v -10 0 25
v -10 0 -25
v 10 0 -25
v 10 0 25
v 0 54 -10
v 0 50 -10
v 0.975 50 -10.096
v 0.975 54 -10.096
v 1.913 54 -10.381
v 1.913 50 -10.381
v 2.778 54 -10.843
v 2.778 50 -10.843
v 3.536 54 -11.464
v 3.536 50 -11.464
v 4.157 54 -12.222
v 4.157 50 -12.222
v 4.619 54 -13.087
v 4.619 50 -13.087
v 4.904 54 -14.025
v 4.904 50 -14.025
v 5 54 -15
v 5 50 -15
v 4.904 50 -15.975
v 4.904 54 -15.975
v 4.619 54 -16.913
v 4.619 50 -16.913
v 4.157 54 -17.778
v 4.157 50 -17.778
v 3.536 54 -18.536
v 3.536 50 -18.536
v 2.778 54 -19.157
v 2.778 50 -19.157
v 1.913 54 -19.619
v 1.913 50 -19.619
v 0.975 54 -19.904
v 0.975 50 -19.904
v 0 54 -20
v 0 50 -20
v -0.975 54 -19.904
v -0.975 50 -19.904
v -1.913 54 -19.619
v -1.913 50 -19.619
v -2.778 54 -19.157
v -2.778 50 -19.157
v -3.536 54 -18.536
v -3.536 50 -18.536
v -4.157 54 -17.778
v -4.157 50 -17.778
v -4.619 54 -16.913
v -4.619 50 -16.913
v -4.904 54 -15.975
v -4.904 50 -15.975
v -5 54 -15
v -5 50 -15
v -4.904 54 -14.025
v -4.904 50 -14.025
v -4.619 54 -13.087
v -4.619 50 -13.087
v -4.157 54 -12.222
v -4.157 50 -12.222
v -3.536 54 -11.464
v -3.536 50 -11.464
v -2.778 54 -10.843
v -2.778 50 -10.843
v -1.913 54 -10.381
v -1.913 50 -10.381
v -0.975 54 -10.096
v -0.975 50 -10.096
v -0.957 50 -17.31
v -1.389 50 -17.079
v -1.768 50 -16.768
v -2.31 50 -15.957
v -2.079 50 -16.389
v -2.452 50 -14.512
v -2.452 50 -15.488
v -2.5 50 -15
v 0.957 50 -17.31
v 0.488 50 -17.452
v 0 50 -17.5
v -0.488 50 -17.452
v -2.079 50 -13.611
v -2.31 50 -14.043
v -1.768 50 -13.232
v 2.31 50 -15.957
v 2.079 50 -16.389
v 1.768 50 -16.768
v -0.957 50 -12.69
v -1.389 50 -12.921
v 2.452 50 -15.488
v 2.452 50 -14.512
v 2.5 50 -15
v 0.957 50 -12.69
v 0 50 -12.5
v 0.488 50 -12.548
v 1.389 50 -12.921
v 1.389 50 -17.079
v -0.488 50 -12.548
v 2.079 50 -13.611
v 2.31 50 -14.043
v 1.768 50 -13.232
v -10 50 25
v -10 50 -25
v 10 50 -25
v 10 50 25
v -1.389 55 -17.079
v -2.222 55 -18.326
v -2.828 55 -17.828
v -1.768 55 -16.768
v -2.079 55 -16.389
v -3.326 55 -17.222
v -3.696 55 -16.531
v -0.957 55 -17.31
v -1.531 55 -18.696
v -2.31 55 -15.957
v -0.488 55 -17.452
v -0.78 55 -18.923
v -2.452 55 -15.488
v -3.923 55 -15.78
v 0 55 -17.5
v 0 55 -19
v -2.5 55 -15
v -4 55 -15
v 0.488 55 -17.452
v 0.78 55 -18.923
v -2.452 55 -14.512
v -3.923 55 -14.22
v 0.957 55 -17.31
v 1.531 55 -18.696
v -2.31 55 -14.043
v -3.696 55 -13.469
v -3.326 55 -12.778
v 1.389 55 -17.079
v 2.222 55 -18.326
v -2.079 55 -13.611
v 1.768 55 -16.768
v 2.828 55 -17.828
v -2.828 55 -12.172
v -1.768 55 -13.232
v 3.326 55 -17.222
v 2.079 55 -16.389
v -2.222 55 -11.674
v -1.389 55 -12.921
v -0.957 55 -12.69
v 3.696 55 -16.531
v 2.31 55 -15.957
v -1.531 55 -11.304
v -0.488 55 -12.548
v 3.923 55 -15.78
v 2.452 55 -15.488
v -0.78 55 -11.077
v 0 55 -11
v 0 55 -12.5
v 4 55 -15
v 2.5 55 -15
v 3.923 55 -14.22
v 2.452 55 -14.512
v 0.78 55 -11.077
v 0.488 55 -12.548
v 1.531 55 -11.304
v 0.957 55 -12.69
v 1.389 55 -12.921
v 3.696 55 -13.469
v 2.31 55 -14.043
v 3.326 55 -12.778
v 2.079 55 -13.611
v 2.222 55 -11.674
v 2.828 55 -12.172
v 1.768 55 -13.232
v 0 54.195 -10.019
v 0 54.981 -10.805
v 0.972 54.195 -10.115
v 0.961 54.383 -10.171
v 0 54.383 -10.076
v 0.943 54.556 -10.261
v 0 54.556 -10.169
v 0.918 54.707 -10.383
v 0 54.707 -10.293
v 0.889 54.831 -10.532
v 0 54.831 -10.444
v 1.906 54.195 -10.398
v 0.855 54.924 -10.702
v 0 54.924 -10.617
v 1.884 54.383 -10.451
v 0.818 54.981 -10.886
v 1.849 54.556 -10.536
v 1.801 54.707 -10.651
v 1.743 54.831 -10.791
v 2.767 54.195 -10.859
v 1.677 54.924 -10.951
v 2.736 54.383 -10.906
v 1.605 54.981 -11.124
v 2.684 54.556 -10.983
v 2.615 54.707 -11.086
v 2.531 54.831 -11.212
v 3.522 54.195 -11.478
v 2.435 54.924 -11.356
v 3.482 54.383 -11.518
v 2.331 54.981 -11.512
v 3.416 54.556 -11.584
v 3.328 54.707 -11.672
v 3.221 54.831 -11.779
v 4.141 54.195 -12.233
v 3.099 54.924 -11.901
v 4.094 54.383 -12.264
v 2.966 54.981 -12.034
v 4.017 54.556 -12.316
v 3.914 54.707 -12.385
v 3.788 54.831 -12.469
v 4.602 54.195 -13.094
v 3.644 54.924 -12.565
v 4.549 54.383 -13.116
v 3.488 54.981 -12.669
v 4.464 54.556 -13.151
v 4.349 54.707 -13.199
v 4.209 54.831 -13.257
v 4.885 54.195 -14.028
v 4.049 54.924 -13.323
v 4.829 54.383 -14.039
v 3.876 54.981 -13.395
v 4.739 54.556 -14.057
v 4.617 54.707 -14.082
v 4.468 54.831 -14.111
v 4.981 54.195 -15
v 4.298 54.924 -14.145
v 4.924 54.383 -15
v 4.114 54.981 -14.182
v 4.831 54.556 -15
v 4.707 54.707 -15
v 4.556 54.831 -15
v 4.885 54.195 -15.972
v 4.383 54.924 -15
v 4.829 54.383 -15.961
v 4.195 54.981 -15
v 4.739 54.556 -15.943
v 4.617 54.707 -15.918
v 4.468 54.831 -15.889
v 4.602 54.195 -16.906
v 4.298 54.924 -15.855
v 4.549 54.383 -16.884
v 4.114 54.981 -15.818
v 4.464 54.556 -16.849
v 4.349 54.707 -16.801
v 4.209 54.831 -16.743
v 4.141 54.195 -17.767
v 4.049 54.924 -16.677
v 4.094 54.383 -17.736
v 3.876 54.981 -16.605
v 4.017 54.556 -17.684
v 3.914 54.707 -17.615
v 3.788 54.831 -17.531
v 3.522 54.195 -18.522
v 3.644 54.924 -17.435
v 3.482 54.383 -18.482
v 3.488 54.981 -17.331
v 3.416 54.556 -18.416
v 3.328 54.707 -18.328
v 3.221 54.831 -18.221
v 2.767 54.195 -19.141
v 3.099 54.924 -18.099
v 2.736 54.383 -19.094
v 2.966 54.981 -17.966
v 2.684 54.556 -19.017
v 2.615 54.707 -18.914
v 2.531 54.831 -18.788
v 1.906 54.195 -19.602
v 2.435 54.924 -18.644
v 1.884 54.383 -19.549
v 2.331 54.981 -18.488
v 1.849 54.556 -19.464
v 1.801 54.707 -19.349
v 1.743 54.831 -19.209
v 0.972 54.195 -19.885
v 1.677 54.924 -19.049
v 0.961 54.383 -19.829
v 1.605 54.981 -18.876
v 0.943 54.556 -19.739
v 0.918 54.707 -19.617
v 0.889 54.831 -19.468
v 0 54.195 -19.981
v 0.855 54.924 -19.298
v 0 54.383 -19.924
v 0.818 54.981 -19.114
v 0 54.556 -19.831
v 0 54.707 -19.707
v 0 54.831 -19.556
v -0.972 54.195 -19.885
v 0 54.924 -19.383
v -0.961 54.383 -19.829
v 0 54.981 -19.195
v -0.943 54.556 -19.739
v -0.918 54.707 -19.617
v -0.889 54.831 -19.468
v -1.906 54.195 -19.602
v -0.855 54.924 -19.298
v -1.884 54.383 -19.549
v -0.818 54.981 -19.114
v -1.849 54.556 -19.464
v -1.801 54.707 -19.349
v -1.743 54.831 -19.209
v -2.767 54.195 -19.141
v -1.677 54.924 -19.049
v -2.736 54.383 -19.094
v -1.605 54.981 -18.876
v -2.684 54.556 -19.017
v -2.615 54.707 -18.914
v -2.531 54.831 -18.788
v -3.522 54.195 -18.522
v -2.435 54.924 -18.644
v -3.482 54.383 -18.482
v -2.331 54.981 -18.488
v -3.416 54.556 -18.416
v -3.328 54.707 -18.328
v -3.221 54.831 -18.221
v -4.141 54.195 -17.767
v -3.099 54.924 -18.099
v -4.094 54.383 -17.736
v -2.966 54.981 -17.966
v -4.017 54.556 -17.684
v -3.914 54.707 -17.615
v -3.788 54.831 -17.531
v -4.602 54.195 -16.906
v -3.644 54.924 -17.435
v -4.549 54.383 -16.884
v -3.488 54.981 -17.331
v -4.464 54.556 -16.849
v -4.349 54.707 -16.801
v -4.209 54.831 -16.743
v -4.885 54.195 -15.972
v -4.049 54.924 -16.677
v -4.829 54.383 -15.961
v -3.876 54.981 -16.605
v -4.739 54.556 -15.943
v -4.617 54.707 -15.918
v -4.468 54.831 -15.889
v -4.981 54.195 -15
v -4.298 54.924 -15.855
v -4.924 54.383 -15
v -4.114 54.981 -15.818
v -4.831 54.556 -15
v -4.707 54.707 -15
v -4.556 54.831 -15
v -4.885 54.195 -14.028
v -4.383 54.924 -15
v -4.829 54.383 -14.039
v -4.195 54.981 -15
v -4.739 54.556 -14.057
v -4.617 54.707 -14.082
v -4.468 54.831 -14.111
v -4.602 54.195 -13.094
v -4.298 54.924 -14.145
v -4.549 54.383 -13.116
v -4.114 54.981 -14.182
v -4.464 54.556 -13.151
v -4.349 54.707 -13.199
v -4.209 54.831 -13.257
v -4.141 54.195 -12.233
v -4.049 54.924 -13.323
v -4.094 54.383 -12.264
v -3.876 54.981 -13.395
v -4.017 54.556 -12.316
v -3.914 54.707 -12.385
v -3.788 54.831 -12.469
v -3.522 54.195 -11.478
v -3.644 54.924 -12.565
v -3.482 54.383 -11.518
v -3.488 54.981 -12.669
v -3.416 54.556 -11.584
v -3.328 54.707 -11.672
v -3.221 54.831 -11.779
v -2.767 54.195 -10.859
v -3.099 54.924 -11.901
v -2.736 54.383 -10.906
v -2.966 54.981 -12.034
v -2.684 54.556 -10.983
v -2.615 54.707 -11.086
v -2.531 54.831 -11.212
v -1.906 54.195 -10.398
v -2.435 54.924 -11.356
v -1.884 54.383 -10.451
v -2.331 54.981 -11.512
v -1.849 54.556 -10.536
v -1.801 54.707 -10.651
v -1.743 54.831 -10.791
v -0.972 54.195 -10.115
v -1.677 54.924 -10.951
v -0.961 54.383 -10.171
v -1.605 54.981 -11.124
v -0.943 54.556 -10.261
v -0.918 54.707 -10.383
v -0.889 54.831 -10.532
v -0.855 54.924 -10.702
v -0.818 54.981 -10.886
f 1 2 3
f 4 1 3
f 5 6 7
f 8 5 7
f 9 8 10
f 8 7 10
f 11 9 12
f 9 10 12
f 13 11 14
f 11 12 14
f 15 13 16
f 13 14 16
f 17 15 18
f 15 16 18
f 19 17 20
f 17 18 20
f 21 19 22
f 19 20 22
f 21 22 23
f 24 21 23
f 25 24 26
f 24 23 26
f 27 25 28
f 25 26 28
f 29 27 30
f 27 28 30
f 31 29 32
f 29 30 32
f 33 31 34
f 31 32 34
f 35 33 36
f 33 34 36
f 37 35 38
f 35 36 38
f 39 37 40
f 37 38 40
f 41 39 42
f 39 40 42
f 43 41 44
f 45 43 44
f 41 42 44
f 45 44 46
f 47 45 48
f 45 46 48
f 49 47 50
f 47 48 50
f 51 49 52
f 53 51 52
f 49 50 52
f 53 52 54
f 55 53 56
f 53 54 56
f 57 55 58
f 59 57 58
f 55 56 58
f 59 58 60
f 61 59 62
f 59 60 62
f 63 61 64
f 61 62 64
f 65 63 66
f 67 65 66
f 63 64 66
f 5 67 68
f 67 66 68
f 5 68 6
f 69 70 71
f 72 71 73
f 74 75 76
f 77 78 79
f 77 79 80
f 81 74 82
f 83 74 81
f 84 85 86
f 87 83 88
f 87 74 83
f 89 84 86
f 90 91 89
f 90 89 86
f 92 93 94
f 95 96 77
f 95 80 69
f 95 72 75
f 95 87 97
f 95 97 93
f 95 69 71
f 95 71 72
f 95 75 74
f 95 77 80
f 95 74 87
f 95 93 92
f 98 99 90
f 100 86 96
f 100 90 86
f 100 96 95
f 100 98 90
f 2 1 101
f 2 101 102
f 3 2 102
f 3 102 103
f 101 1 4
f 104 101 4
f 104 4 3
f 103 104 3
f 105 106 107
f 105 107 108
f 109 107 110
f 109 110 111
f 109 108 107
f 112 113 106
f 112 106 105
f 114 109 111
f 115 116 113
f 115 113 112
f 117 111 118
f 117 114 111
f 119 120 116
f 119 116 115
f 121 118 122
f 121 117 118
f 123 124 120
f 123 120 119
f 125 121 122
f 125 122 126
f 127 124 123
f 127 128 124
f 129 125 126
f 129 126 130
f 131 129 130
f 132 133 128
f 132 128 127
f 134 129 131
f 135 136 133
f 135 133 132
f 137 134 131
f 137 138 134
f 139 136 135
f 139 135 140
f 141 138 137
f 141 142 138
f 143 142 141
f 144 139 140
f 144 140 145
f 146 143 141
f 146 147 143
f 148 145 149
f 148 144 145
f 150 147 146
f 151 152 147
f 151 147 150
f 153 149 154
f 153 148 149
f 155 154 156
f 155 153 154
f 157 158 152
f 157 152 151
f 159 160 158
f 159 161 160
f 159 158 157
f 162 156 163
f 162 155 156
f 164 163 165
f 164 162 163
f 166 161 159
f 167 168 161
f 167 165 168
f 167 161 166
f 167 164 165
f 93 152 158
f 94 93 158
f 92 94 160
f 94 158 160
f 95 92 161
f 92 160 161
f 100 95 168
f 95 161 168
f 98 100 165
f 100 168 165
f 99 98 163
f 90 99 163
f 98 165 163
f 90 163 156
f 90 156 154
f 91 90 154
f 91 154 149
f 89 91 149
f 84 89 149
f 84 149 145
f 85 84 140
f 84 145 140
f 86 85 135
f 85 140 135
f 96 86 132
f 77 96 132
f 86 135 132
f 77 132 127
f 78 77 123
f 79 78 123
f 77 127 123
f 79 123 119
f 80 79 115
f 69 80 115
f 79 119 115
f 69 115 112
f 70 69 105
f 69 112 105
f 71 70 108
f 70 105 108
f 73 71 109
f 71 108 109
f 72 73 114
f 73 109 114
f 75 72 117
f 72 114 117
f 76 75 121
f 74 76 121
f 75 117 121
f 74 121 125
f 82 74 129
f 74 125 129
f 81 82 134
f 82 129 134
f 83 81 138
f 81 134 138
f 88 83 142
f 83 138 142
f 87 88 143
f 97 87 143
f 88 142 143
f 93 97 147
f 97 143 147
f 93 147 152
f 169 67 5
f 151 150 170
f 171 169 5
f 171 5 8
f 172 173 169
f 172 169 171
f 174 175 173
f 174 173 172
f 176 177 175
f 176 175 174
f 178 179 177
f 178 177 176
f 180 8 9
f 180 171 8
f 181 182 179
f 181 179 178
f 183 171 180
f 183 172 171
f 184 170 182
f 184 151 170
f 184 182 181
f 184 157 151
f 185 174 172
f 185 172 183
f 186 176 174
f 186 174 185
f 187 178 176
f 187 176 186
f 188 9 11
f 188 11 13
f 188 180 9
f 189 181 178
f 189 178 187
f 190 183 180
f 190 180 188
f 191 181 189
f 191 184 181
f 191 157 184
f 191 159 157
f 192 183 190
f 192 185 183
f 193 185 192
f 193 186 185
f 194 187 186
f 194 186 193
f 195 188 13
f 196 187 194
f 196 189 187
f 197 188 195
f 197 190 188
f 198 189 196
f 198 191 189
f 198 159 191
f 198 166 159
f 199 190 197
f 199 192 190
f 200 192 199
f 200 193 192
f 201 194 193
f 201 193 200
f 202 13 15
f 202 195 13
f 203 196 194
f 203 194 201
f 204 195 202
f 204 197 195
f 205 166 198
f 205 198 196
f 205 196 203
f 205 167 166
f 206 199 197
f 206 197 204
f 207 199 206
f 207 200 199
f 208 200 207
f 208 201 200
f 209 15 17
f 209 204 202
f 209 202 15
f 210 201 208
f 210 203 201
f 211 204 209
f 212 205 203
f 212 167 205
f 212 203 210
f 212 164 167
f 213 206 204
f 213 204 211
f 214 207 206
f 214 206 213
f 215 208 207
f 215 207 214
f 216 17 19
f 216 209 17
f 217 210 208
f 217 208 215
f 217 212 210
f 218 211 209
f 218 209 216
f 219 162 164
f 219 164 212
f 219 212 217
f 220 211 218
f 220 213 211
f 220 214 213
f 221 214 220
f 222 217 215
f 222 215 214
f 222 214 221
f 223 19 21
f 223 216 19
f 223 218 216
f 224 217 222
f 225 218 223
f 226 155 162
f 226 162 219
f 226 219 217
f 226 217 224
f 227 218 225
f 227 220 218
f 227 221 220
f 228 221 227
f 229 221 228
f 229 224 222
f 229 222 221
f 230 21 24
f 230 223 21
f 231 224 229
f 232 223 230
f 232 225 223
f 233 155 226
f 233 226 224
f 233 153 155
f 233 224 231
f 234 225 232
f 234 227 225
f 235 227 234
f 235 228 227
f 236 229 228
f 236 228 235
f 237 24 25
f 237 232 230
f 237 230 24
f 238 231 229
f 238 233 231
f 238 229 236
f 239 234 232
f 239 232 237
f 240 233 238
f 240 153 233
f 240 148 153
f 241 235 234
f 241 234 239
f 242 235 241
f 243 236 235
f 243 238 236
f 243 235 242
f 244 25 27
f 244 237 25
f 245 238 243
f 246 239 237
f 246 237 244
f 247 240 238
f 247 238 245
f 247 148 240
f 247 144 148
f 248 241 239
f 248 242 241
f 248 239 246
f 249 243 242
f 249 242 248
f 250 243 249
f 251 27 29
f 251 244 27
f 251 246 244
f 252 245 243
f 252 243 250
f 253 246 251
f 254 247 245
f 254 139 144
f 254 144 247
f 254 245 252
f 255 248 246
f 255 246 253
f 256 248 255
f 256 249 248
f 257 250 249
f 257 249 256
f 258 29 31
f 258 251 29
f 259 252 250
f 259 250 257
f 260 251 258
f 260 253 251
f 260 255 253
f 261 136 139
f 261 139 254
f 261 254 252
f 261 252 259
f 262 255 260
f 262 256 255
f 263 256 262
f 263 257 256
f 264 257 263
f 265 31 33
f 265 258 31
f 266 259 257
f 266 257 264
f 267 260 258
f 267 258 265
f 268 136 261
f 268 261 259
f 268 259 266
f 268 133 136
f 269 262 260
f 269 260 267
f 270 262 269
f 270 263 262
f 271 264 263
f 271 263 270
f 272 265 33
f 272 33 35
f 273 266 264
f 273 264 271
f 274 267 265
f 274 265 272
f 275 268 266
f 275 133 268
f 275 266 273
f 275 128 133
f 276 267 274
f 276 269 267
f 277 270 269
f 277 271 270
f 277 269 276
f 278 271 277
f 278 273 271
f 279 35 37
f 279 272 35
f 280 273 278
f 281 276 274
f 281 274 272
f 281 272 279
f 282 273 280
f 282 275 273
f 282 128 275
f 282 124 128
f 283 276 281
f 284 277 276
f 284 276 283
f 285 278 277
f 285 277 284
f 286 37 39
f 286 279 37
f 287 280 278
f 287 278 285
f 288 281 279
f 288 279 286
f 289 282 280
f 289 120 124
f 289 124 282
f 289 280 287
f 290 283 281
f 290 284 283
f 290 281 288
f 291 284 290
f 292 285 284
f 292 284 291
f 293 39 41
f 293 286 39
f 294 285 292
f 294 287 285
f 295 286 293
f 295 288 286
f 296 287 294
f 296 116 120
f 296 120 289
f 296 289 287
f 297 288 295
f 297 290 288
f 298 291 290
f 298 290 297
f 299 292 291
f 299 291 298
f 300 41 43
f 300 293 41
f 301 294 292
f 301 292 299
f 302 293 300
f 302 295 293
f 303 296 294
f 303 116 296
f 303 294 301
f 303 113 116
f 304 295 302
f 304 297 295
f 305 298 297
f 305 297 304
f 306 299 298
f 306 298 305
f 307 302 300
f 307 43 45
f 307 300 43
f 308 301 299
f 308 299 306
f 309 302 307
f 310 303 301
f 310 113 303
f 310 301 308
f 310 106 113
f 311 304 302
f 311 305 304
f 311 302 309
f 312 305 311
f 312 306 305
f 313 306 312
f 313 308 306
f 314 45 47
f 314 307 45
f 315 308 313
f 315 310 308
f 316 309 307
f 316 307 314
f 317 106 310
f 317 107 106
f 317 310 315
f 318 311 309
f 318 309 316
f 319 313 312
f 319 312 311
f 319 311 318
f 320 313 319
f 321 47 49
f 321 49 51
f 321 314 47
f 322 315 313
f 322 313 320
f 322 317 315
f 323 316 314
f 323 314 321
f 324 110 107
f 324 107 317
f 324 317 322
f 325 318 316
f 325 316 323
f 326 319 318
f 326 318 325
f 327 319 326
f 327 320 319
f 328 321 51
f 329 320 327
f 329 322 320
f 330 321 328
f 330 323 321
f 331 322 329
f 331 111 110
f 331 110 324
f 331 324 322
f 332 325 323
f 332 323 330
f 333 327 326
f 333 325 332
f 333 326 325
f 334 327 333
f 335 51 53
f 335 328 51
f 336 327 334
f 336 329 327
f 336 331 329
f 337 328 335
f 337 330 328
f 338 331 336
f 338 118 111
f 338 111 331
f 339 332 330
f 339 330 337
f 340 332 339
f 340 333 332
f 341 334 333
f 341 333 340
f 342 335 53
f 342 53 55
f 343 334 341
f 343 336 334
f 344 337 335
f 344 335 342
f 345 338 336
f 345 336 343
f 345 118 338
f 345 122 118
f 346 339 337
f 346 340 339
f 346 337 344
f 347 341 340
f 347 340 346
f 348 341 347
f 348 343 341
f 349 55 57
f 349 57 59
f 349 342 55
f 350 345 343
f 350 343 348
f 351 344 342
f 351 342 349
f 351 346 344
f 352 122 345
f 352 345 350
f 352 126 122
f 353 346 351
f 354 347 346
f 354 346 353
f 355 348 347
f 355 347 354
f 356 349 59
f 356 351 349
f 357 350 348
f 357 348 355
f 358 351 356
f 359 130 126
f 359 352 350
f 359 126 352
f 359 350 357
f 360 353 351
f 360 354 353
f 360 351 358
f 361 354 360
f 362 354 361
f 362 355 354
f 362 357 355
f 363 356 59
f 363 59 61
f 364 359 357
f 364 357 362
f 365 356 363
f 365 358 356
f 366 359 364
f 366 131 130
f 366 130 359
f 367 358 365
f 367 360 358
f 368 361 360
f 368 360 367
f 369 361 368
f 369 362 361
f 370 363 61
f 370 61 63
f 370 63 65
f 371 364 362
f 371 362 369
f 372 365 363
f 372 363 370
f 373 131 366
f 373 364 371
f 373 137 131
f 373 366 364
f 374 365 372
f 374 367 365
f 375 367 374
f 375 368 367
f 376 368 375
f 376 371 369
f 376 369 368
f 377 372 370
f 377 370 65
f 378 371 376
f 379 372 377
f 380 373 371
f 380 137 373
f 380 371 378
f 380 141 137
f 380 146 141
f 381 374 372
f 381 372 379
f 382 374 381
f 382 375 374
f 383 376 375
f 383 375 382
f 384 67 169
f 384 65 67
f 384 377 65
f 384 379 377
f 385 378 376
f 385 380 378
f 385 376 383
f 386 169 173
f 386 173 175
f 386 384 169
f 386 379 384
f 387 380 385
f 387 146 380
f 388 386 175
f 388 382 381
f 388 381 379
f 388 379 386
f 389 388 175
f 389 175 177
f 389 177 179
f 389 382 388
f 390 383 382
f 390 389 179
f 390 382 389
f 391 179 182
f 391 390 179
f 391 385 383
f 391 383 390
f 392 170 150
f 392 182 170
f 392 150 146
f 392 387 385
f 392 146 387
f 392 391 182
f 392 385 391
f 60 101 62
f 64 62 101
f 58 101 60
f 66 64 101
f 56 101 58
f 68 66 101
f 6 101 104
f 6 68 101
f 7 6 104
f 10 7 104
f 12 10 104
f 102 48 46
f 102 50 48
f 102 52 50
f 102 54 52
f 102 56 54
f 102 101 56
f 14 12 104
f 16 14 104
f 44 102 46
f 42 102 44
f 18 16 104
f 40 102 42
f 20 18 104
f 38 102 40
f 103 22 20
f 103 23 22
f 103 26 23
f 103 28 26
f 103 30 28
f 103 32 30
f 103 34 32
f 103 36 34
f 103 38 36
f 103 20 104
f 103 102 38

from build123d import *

# Parameters (mm, degrees)
SKETCH1_W           = 20
SKETCH1_H           = 50
BOSS_EXTRUDE1_DEPTH = 50
SKETCH2_R           = 5
BOSS_EXTRUDE2_DEPTH = 5
SKETCH3_R           = 2.5
CUT_EXTRUDE1_DEPTH  = 5
FILLET1_R           = 1


with BuildPart() as part:
    # Sketch1 → Boss-Extrude1 (new body)
    with BuildSketch(Plane(origin=(0, 0, 0), x_dir=(1, 0, 0), z_dir=(0, 1, 0))):
        Rectangle(SKETCH1_W, SKETCH1_H)
    extrude(amount=BOSS_EXTRUDE1_DEPTH)

    # Sketch2 → Boss-Extrude2 (add)
    with BuildSketch(Plane(origin=(0, 50, 0), x_dir=(1, 0, 0), z_dir=(0, 1, 0))):
        with Locations(Location((0, 15, 0), (0, 0, 270))):
            Circle(SKETCH2_R)
    extrude(amount=BOSS_EXTRUDE2_DEPTH)

    # Sketch3 → Cut-Extrude1 (cut)
    with BuildSketch(Plane(origin=(0, 55, 0), x_dir=(1, 0, 0), z_dir=(0, 1, 0))):
        with Locations(Location((0, 15, 0), (0, 0, 270))):
            Circle(SKETCH3_R)
    extrude(amount=-CUT_EXTRUDE1_DEPTH, mode=Mode.SUBTRACT)

    # Fillet1
    fillet1_edges = [part.edges().sort_by_distance(p)[0] for p in [
        (0, 55, -20),
    ]]
    fillet(fillet1_edges, radius=FILLET1_R)


solid = part.part
